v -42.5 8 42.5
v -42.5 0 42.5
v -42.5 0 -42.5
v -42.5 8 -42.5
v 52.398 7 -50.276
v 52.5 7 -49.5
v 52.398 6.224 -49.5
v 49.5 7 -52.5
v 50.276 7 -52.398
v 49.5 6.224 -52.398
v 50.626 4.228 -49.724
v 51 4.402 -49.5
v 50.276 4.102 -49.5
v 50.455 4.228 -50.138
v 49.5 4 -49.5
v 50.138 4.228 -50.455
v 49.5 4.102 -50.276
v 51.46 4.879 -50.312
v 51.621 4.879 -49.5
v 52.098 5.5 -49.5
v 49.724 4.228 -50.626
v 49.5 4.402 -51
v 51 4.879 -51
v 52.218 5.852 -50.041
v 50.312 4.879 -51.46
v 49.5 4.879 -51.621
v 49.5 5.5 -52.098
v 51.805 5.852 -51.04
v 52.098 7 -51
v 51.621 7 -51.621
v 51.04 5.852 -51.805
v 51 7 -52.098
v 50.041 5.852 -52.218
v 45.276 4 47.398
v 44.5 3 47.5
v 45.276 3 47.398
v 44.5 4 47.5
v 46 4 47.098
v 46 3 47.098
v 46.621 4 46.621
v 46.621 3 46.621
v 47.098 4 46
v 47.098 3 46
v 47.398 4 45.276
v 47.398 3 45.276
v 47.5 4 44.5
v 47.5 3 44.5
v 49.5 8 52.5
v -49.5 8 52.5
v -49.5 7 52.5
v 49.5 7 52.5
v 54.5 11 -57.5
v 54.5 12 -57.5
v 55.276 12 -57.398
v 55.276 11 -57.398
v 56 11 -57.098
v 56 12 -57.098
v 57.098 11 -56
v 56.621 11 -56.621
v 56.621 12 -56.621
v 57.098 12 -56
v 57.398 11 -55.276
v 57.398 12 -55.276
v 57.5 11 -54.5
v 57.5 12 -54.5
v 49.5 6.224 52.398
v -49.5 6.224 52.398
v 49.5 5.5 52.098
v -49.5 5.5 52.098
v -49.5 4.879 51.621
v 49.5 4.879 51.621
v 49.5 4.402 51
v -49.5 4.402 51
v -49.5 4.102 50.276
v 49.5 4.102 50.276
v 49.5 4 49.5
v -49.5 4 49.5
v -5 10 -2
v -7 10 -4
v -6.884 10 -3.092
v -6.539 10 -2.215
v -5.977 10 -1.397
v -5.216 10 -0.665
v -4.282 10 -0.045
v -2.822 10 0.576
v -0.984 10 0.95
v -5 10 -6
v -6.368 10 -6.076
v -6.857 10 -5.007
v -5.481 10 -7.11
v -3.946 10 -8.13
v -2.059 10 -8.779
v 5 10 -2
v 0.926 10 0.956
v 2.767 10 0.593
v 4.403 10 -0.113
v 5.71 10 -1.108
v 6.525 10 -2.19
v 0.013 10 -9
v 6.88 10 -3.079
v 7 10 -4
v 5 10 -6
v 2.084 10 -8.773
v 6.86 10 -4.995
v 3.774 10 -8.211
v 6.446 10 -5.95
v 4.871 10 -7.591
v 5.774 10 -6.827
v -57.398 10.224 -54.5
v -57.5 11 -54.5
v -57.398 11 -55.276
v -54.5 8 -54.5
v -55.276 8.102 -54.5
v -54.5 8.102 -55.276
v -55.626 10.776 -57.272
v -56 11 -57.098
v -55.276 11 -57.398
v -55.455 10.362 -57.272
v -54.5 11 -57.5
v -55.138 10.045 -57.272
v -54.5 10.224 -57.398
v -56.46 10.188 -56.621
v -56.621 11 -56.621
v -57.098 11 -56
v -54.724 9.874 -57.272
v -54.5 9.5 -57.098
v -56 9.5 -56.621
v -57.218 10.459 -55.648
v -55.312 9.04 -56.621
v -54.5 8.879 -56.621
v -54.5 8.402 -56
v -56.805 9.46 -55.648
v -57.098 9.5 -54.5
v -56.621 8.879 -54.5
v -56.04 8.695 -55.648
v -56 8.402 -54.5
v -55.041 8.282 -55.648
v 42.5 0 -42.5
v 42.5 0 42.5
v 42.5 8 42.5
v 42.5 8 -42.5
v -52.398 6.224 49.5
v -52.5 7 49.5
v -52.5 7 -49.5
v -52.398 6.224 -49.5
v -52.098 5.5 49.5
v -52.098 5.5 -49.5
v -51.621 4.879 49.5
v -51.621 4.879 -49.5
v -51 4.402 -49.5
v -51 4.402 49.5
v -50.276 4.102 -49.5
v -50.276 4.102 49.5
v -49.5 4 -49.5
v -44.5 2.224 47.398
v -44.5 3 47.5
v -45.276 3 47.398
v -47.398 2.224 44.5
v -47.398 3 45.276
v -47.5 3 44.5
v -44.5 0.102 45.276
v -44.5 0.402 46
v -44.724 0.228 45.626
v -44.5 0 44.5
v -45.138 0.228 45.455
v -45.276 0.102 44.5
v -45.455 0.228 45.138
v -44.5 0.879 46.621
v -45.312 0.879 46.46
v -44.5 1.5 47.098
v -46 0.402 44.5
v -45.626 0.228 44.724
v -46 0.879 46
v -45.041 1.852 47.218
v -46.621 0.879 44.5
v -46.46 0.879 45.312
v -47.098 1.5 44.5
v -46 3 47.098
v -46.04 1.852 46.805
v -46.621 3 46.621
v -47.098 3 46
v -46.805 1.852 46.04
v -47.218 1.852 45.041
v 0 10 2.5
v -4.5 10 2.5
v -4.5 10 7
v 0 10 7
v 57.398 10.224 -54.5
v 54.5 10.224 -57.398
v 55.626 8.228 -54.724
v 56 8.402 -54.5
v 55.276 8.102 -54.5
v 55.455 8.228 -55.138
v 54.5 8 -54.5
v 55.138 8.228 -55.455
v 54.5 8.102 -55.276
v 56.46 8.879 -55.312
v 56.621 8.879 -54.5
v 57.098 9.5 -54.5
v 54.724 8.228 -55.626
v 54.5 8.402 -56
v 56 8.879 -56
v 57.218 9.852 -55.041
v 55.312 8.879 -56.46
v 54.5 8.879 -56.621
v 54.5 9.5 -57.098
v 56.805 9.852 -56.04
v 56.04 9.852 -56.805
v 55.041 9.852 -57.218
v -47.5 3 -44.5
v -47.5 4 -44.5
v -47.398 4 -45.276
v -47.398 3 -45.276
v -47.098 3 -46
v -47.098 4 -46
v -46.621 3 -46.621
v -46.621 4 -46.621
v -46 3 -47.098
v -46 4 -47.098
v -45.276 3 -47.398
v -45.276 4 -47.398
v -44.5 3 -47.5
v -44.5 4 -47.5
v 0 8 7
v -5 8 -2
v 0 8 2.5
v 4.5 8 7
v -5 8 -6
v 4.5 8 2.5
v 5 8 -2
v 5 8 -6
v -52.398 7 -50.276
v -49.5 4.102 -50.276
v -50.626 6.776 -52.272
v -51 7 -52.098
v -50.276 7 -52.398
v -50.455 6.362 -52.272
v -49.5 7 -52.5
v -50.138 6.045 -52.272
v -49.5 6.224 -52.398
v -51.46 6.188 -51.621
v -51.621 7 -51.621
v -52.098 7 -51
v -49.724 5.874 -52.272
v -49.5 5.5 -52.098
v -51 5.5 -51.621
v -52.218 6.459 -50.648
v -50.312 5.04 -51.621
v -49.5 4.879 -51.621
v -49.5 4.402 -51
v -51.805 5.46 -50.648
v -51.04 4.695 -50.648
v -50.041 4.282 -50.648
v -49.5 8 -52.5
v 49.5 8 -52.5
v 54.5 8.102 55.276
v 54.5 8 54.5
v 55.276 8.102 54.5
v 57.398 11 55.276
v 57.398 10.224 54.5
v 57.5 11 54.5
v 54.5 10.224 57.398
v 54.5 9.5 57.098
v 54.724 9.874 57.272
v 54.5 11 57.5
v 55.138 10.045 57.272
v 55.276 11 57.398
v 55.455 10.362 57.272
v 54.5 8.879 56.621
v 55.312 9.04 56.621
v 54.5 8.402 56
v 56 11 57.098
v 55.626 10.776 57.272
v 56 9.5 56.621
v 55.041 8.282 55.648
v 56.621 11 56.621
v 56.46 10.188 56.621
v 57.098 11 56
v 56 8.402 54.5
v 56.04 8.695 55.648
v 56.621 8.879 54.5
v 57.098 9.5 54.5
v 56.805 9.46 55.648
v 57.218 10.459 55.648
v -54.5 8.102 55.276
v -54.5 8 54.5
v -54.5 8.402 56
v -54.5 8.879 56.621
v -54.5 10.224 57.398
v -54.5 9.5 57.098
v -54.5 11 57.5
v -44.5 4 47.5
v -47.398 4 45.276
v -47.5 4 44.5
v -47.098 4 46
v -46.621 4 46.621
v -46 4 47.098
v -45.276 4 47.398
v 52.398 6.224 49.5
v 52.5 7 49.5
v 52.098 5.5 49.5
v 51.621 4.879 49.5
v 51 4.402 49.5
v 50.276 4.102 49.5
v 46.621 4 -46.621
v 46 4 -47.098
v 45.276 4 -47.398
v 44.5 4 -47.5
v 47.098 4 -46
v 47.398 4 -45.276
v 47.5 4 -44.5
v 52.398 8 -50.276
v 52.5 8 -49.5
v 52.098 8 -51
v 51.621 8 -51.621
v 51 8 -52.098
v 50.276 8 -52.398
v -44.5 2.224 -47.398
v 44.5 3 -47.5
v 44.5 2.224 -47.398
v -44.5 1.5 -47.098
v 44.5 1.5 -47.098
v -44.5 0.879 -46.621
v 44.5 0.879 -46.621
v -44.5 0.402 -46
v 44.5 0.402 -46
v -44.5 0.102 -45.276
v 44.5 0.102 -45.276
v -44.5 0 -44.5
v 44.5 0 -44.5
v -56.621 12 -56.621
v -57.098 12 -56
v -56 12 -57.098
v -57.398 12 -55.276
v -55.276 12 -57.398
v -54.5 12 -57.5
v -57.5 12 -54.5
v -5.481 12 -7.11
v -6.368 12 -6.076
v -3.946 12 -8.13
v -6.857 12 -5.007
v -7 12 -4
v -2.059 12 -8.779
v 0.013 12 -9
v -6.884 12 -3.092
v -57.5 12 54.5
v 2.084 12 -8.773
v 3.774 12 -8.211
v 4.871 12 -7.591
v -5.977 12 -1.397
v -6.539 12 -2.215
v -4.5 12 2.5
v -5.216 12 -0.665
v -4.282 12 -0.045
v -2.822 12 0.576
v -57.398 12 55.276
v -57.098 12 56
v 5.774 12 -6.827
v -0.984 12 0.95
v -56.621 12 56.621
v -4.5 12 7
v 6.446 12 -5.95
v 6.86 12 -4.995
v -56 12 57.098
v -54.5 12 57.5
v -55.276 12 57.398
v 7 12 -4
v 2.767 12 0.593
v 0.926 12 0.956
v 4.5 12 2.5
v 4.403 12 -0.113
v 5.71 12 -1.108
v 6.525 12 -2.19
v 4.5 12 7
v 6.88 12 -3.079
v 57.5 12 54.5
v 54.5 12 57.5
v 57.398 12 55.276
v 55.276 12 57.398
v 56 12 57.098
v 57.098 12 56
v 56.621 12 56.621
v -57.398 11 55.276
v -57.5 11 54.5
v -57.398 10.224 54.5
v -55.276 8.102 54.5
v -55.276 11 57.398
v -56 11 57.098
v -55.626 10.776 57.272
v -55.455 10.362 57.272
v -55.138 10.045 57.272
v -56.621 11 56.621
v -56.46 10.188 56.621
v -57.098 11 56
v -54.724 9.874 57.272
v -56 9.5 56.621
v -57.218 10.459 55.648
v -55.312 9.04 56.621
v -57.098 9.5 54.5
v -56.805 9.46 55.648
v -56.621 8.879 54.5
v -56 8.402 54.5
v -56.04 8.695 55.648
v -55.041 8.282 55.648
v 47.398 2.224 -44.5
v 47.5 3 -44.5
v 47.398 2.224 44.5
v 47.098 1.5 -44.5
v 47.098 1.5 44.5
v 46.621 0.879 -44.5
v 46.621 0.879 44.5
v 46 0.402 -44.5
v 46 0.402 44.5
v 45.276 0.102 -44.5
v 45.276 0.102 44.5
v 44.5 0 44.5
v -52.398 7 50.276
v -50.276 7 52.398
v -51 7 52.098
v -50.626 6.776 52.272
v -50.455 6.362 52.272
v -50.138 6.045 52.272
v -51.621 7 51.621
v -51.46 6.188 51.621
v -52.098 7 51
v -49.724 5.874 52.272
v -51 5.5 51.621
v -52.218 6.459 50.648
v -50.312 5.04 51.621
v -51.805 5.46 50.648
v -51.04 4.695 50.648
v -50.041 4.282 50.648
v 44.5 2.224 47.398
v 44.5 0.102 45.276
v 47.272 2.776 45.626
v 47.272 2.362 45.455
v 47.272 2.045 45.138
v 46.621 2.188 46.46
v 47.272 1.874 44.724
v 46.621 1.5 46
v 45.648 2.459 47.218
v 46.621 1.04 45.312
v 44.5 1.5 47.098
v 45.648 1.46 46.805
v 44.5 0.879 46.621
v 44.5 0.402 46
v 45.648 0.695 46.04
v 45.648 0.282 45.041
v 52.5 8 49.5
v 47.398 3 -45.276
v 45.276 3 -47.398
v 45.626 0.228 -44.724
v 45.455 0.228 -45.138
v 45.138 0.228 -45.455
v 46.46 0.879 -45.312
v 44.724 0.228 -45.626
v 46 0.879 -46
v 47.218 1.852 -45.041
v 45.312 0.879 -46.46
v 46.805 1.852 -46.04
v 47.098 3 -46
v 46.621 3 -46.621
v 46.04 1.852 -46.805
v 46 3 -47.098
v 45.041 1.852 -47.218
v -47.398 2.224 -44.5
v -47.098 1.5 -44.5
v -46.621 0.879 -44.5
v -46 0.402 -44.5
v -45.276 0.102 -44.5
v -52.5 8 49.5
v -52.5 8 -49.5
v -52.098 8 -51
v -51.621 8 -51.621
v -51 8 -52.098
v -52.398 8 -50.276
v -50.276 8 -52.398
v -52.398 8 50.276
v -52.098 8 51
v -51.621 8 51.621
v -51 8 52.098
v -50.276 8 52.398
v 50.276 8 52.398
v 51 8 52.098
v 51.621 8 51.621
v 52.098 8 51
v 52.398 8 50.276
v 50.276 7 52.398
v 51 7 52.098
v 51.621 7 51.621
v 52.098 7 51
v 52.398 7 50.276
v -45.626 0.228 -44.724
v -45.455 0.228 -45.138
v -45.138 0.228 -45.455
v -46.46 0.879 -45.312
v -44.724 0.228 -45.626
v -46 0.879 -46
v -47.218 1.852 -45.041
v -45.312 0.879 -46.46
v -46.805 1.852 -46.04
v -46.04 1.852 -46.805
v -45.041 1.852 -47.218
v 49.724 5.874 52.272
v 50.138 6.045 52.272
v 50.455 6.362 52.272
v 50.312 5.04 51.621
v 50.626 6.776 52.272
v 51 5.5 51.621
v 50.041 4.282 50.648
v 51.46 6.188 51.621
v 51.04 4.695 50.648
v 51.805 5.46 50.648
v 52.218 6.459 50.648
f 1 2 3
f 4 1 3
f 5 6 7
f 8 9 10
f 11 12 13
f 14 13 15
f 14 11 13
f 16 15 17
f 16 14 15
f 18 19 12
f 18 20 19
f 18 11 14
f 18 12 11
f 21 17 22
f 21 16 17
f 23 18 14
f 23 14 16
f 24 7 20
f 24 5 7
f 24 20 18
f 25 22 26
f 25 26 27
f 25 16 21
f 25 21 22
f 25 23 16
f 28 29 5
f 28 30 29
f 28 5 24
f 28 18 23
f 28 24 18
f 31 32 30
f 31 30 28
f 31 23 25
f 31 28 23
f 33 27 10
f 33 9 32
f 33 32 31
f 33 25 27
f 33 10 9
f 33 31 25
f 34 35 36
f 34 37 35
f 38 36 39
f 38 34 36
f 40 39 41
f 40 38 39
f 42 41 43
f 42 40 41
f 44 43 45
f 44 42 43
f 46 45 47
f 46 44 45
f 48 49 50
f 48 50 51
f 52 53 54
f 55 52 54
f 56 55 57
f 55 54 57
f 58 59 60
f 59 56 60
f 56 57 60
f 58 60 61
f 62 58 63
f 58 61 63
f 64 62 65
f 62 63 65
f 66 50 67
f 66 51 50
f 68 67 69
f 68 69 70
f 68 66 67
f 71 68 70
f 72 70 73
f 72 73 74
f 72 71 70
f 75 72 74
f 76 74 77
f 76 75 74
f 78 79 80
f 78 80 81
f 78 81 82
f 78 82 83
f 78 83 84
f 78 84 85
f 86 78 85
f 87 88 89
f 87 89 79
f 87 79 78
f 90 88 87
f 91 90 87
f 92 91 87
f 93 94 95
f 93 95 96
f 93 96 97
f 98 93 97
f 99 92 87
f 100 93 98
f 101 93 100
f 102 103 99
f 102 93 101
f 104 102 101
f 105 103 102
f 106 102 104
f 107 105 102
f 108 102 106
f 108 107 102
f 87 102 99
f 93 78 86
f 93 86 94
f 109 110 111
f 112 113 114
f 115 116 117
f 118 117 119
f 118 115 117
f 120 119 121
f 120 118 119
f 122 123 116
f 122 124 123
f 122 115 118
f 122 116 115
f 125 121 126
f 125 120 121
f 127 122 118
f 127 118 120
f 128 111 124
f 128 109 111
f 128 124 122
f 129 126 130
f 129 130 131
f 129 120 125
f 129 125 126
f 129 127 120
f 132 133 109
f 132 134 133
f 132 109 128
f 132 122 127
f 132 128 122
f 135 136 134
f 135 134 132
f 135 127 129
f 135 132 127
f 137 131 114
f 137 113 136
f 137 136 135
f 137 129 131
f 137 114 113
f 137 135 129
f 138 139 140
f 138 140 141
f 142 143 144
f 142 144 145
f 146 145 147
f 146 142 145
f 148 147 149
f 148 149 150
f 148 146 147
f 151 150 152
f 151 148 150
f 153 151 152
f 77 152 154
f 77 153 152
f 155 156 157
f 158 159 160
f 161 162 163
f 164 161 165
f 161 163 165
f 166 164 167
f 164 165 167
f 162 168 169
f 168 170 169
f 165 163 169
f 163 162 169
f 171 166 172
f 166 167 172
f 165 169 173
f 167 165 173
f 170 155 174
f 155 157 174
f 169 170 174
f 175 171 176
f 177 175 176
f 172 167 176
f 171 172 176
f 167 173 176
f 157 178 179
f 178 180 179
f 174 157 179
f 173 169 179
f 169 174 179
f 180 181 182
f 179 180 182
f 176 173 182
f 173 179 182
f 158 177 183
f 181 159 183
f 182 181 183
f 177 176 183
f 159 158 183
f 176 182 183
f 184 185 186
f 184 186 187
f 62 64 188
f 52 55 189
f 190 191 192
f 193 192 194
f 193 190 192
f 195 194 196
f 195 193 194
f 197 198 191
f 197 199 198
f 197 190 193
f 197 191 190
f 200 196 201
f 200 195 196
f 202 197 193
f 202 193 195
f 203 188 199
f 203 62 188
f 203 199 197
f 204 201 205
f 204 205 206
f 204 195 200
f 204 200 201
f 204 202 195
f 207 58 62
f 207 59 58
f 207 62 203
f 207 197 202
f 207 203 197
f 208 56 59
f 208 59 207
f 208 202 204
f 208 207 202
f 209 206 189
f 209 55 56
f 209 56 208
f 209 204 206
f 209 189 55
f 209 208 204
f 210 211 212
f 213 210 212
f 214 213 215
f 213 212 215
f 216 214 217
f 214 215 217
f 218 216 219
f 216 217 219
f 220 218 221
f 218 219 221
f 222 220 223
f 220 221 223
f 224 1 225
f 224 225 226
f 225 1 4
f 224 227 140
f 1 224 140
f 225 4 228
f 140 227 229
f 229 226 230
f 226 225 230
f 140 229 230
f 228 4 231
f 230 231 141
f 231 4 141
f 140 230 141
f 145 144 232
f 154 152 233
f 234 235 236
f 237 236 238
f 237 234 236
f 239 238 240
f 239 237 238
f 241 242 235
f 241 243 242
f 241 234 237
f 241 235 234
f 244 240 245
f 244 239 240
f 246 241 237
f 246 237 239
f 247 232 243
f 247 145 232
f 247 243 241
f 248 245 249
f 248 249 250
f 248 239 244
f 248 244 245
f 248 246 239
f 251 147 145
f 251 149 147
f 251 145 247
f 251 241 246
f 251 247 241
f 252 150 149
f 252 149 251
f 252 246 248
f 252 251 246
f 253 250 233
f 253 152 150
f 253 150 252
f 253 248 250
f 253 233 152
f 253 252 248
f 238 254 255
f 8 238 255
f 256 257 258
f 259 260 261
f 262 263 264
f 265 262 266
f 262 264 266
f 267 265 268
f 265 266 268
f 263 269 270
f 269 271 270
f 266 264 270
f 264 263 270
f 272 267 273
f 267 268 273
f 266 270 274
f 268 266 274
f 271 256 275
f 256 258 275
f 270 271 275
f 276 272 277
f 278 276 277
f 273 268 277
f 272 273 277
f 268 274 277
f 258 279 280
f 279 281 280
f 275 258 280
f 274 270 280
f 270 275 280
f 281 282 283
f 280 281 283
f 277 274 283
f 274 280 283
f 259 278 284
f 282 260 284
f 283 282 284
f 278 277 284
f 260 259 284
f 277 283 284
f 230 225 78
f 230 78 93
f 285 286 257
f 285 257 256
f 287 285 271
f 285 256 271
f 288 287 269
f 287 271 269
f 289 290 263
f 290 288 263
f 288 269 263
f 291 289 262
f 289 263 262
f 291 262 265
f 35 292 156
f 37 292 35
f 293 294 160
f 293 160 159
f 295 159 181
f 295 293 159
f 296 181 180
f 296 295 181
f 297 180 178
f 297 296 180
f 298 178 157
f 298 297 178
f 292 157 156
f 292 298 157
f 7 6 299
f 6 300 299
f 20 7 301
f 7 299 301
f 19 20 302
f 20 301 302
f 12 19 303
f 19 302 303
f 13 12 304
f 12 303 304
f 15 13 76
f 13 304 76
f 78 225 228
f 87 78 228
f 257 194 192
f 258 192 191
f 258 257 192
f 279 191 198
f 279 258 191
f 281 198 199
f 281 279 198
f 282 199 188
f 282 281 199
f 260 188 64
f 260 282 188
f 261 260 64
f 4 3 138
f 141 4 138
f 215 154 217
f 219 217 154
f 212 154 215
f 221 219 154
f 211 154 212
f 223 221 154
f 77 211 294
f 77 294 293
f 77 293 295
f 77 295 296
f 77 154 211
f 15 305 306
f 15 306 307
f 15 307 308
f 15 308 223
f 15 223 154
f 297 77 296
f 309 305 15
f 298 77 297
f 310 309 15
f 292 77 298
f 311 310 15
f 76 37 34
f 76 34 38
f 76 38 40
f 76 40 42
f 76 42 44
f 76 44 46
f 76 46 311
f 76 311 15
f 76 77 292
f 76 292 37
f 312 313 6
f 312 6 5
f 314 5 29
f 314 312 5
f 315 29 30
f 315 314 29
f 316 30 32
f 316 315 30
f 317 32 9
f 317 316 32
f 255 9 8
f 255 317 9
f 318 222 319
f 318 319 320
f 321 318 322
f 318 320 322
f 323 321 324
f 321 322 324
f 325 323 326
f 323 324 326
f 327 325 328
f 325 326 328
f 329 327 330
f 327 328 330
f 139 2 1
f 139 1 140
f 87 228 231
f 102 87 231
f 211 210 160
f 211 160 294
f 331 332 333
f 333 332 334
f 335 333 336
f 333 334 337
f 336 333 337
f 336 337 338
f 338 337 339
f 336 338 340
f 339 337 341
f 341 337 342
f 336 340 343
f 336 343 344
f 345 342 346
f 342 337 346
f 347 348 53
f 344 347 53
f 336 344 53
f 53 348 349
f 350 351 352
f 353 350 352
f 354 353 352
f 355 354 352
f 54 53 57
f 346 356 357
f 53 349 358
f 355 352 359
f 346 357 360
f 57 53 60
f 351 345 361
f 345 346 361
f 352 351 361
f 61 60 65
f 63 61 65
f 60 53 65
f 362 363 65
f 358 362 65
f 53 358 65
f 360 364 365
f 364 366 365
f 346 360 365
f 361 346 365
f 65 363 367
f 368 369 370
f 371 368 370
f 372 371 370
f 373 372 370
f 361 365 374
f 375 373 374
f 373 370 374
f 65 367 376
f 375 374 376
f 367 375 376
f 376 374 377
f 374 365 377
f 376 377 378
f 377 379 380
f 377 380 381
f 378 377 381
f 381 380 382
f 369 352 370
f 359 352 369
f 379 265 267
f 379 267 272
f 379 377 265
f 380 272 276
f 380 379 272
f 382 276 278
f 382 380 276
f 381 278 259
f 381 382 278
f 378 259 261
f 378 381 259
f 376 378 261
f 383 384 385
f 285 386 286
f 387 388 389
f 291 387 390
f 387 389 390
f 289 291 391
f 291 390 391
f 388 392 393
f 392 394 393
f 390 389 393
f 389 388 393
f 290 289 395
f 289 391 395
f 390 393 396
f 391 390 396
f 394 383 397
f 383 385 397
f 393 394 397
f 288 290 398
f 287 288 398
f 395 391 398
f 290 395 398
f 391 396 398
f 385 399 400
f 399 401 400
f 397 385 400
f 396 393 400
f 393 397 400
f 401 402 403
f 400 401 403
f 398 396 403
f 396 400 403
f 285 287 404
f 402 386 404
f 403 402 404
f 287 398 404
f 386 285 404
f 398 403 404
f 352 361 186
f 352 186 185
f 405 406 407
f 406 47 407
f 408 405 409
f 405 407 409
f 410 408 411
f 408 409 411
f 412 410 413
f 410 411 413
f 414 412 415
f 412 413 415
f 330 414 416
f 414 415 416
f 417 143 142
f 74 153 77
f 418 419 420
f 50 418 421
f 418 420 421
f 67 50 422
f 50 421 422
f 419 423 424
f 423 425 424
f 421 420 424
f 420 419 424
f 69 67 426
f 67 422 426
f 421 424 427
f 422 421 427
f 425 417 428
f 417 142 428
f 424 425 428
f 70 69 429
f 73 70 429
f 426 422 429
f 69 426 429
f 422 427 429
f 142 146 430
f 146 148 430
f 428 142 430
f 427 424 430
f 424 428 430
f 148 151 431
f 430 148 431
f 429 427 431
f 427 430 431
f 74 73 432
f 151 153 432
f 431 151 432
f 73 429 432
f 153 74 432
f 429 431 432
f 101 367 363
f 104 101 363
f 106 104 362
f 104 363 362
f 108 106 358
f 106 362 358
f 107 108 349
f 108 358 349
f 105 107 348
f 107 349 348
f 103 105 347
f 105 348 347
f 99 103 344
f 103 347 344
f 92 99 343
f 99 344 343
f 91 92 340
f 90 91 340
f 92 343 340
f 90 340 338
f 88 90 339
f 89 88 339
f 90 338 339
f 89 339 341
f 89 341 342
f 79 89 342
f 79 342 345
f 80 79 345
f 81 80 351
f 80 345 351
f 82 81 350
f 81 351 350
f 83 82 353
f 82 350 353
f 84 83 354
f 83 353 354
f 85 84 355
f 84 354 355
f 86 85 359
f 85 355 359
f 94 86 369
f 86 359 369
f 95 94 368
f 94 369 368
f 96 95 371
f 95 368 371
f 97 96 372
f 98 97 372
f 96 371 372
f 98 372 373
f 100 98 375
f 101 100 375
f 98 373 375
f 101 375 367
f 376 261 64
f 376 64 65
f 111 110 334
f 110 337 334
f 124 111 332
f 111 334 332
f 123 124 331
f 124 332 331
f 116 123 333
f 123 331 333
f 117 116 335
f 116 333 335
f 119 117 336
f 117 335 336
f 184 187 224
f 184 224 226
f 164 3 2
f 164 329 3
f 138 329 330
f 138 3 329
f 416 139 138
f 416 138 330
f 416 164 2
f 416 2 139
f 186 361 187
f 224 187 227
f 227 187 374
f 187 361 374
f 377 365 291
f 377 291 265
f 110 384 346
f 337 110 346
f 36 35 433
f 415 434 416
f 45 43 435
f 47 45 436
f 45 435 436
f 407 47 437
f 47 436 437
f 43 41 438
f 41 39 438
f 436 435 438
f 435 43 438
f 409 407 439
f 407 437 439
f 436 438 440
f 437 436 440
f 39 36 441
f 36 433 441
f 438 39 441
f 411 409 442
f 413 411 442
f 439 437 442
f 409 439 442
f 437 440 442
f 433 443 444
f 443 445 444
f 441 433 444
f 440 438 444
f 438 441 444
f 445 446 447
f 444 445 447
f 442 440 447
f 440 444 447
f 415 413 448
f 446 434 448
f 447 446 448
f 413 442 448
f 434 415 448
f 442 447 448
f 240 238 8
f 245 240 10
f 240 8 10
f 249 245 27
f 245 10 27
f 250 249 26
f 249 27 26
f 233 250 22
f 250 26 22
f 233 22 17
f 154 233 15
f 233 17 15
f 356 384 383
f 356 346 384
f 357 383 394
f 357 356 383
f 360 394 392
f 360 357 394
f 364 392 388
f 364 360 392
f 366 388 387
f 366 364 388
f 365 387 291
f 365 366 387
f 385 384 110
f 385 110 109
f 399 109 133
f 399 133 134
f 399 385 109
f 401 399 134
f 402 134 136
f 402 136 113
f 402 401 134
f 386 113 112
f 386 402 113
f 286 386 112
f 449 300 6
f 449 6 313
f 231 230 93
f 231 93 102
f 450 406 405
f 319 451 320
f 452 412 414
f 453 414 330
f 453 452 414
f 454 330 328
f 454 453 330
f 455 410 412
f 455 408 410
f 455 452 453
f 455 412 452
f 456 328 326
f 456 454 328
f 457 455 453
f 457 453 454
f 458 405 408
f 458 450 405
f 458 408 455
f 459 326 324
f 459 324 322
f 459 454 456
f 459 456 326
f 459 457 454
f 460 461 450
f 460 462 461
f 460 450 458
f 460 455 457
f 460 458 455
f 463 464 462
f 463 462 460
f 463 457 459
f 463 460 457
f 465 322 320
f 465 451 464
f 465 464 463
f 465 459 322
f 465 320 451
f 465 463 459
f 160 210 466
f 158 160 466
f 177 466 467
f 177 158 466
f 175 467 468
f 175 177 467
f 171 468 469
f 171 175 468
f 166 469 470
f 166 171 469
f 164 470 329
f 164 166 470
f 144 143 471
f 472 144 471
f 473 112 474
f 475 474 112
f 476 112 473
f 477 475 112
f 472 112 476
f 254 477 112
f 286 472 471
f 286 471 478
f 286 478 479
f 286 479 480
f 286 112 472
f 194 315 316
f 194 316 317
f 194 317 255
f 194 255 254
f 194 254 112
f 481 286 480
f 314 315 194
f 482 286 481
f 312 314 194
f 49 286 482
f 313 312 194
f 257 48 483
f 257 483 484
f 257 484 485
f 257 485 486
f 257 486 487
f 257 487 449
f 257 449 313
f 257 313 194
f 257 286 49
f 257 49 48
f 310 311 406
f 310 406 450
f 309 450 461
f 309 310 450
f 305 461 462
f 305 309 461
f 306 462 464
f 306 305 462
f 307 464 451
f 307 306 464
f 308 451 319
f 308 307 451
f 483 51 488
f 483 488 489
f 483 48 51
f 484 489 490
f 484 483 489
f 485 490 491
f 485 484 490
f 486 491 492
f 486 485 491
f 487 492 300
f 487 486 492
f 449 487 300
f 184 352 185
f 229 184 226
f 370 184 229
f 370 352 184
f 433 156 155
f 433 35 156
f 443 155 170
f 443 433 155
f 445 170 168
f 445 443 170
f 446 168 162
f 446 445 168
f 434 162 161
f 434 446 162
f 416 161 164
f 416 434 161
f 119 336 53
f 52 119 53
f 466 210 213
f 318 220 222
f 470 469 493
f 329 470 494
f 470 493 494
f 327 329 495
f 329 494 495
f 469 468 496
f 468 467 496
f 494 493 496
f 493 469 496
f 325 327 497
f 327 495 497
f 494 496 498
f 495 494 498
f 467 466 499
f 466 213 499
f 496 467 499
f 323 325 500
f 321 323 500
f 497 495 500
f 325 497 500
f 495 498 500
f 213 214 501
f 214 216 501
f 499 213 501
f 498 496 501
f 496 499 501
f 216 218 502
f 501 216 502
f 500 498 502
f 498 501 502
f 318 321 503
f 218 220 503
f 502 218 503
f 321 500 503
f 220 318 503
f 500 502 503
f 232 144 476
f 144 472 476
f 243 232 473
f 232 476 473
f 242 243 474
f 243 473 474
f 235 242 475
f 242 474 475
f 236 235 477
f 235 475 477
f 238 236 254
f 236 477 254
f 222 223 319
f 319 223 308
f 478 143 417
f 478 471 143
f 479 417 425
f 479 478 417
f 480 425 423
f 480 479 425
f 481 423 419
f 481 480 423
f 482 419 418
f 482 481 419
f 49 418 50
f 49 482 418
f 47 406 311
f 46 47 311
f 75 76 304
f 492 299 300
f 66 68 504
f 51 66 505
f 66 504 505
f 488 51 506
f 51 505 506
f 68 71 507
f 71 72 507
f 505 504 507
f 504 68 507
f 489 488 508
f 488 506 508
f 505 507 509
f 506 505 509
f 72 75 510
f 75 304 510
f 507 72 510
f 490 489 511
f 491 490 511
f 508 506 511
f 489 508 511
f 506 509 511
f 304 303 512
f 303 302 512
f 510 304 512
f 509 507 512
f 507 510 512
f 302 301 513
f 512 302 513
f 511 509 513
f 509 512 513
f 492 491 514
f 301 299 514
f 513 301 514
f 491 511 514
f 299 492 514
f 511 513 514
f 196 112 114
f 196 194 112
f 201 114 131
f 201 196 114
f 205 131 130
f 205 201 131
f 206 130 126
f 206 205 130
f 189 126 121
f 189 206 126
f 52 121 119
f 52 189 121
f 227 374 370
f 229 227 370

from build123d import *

# Parameters (mm, degrees)
SKETCH7_W                = 95
SKETCH7_H                = 4
BOSS_EXTRUDE4_DEPTH      = 47.5
BOSS_EXTRUDE4_DEPTH_BACK = 47.5
SKETCH8_W                = 105
SKETCH8_H                = 4
BOSS_EXTRUDE5_DEPTH      = 52.5
BOSS_EXTRUDE5_DEPTH_BACK = 52.5
SKETCH9_W                = 115
SKETCH9_H                = 4
BOSS_EXTRUDE6_DEPTH      = 57.5
BOSS_EXTRUDE6_DEPTH_BACK = 57.5
SKETCH10_W               = 85
SKETCH10_H               = 85
CUT_EXTRUDE1_DEPTH       = 8
CUT_EXTRUDE1_DEPTH_BACK  = 3.5
SKETCH12_RX              = 7
SKETCH12_RY              = 5
CUT_EXTRUDE2_DEPTH       = 2
SKETCH13_W               = 10
SKETCH13_H               = 4
CUT_EXTRUDE3_DEPTH       = 29
CUT_EXTRUDE3_DEPTH_BACK  = 1
FILLET4_R                = 3
SKETCH14_W               = 9
SKETCH14_H               = 4.5
CUT_EXTRUDE4_DEPTH       = 2
SKETCH16_W               = 4.5
SKETCH16_H               = 4.5
CUT_EXTRUDE5_DEPTH       = 10


with BuildPart() as part:
    # Sketch7 → Boss-Extrude4 (new body, two sides)
    with BuildSketch(Plane.XY) as boss_extrude4_sk:
        with Locations((0, 2)):
            Rectangle(SKETCH7_W, SKETCH7_H)
    extrude(amount=BOSS_EXTRUDE4_DEPTH)
    extrude(boss_extrude4_sk.sketch, amount=-BOSS_EXTRUDE4_DEPTH_BACK)

    # Sketch8 → Boss-Extrude5 (add, two sides)
    with BuildSketch(Plane.XY) as boss_extrude5_sk:
        with Locations((0, 6)):
            Rectangle(SKETCH8_W, SKETCH8_H)
    extrude(amount=BOSS_EXTRUDE5_DEPTH)
    extrude(boss_extrude5_sk.sketch, amount=-BOSS_EXTRUDE5_DEPTH_BACK)

    # Sketch9 → Boss-Extrude6 (add, two sides)
    with BuildSketch(Plane.XY) as boss_extrude6_sk:
        with Locations((0, 10)):
            Rectangle(SKETCH9_W, SKETCH9_H)
    extrude(amount=BOSS_EXTRUDE6_DEPTH)
    extrude(boss_extrude6_sk.sketch, amount=-BOSS_EXTRUDE6_DEPTH_BACK)

    # Sketch10 → Cut-Extrude1 (cut, two sides)
    with BuildSketch(Plane(origin=(0, 0, 0), x_dir=(1, 0, 0), z_dir=(0, 1, 0))) as cut_extrude1_sk:
        Rectangle(SKETCH10_W, SKETCH10_H)
    extrude(amount=CUT_EXTRUDE1_DEPTH, mode=Mode.SUBTRACT)
    extrude(cut_extrude1_sk.sketch, amount=-CUT_EXTRUDE1_DEPTH_BACK, mode=Mode.SUBTRACT)

    # Sketch12 → Cut-Extrude2 (cut)
    with BuildSketch(Plane(origin=(0, 12, 0), x_dir=(1, 0, 0), z_dir=(0, 1, 0))):
        with Locations((0, 4)):
            Ellipse(SKETCH12_RX, SKETCH12_RY)
    extrude(amount=-CUT_EXTRUDE2_DEPTH, mode=Mode.SUBTRACT)

    # Sketch13 → Cut-Extrude3 (cut, two sides)
    with BuildSketch(Plane(origin=(0, 0, 0), x_dir=(1, 0, 0), z_dir=(0, 1, 0))) as cut_extrude3_sk:
        with Locations((0, 4)):
            Rectangle(SKETCH13_W, SKETCH13_H)
    extrude(amount=CUT_EXTRUDE3_DEPTH, mode=Mode.SUBTRACT)
    extrude(cut_extrude3_sk.sketch, amount=-CUT_EXTRUDE3_DEPTH_BACK, mode=Mode.SUBTRACT)

    # Fillet4
    fillet4_edges = [part.edges().sort_by_distance(p)[0] for p in [
        (-47.5, 2, 47.5),
        (47.5, 2, -47.5),
        (0, 0, 47.5),
        (47.5, 2, 47.5),
        (-52.5, 4, 0),
        (-52.5, 6, -52.5),
        (52.5, 6, -52.5),
        (52.5, 4, 0),
        (0, 4, -52.5),
        (-52.5, 6, 52.5),
        (0, 4, 52.5),
        (52.5, 6, 52.5),
        (-57.5, 8, 0),
        (-57.5, 10, -57.5),
        (57.5, 10, -57.5),
        (57.5, 8, 0),
        (0, 8, -57.5),
        (-57.5, 10, 57.5),
        (0, 8, 57.5),
        (57.5, 10, 57.5),
        (-47.5, 2, -47.5),
        (47.5, 0, 0),
        (-47.5, 0, 0),
        (0, 0, -47.5),
    ]]
    fillet(fillet4_edges, radius=FILLET4_R)

    # Sketch14 → Cut-Extrude4 (cut)
    with BuildSketch(Plane(origin=(0, 12, 0), x_dir=(1, 0, 0), z_dir=(0, 1, 0))):
        with Locations((0, -4.75)):
            Rectangle(SKETCH14_W, SKETCH14_H)
    extrude(amount=-CUT_EXTRUDE4_DEPTH, mode=Mode.SUBTRACT)

    # Sketch16 → Cut-Extrude5 (cut)
    with BuildSketch(Plane(origin=(0, 12, 0), x_dir=(1, 0, 0), z_dir=(0, 1, 0))):
        with Locations((2.25, -4.75)):
            Rectangle(SKETCH16_W, SKETCH16_H)
    extrude(amount=-CUT_EXTRUDE5_DEPTH, mode=Mode.SUBTRACT)


solid = part.part
